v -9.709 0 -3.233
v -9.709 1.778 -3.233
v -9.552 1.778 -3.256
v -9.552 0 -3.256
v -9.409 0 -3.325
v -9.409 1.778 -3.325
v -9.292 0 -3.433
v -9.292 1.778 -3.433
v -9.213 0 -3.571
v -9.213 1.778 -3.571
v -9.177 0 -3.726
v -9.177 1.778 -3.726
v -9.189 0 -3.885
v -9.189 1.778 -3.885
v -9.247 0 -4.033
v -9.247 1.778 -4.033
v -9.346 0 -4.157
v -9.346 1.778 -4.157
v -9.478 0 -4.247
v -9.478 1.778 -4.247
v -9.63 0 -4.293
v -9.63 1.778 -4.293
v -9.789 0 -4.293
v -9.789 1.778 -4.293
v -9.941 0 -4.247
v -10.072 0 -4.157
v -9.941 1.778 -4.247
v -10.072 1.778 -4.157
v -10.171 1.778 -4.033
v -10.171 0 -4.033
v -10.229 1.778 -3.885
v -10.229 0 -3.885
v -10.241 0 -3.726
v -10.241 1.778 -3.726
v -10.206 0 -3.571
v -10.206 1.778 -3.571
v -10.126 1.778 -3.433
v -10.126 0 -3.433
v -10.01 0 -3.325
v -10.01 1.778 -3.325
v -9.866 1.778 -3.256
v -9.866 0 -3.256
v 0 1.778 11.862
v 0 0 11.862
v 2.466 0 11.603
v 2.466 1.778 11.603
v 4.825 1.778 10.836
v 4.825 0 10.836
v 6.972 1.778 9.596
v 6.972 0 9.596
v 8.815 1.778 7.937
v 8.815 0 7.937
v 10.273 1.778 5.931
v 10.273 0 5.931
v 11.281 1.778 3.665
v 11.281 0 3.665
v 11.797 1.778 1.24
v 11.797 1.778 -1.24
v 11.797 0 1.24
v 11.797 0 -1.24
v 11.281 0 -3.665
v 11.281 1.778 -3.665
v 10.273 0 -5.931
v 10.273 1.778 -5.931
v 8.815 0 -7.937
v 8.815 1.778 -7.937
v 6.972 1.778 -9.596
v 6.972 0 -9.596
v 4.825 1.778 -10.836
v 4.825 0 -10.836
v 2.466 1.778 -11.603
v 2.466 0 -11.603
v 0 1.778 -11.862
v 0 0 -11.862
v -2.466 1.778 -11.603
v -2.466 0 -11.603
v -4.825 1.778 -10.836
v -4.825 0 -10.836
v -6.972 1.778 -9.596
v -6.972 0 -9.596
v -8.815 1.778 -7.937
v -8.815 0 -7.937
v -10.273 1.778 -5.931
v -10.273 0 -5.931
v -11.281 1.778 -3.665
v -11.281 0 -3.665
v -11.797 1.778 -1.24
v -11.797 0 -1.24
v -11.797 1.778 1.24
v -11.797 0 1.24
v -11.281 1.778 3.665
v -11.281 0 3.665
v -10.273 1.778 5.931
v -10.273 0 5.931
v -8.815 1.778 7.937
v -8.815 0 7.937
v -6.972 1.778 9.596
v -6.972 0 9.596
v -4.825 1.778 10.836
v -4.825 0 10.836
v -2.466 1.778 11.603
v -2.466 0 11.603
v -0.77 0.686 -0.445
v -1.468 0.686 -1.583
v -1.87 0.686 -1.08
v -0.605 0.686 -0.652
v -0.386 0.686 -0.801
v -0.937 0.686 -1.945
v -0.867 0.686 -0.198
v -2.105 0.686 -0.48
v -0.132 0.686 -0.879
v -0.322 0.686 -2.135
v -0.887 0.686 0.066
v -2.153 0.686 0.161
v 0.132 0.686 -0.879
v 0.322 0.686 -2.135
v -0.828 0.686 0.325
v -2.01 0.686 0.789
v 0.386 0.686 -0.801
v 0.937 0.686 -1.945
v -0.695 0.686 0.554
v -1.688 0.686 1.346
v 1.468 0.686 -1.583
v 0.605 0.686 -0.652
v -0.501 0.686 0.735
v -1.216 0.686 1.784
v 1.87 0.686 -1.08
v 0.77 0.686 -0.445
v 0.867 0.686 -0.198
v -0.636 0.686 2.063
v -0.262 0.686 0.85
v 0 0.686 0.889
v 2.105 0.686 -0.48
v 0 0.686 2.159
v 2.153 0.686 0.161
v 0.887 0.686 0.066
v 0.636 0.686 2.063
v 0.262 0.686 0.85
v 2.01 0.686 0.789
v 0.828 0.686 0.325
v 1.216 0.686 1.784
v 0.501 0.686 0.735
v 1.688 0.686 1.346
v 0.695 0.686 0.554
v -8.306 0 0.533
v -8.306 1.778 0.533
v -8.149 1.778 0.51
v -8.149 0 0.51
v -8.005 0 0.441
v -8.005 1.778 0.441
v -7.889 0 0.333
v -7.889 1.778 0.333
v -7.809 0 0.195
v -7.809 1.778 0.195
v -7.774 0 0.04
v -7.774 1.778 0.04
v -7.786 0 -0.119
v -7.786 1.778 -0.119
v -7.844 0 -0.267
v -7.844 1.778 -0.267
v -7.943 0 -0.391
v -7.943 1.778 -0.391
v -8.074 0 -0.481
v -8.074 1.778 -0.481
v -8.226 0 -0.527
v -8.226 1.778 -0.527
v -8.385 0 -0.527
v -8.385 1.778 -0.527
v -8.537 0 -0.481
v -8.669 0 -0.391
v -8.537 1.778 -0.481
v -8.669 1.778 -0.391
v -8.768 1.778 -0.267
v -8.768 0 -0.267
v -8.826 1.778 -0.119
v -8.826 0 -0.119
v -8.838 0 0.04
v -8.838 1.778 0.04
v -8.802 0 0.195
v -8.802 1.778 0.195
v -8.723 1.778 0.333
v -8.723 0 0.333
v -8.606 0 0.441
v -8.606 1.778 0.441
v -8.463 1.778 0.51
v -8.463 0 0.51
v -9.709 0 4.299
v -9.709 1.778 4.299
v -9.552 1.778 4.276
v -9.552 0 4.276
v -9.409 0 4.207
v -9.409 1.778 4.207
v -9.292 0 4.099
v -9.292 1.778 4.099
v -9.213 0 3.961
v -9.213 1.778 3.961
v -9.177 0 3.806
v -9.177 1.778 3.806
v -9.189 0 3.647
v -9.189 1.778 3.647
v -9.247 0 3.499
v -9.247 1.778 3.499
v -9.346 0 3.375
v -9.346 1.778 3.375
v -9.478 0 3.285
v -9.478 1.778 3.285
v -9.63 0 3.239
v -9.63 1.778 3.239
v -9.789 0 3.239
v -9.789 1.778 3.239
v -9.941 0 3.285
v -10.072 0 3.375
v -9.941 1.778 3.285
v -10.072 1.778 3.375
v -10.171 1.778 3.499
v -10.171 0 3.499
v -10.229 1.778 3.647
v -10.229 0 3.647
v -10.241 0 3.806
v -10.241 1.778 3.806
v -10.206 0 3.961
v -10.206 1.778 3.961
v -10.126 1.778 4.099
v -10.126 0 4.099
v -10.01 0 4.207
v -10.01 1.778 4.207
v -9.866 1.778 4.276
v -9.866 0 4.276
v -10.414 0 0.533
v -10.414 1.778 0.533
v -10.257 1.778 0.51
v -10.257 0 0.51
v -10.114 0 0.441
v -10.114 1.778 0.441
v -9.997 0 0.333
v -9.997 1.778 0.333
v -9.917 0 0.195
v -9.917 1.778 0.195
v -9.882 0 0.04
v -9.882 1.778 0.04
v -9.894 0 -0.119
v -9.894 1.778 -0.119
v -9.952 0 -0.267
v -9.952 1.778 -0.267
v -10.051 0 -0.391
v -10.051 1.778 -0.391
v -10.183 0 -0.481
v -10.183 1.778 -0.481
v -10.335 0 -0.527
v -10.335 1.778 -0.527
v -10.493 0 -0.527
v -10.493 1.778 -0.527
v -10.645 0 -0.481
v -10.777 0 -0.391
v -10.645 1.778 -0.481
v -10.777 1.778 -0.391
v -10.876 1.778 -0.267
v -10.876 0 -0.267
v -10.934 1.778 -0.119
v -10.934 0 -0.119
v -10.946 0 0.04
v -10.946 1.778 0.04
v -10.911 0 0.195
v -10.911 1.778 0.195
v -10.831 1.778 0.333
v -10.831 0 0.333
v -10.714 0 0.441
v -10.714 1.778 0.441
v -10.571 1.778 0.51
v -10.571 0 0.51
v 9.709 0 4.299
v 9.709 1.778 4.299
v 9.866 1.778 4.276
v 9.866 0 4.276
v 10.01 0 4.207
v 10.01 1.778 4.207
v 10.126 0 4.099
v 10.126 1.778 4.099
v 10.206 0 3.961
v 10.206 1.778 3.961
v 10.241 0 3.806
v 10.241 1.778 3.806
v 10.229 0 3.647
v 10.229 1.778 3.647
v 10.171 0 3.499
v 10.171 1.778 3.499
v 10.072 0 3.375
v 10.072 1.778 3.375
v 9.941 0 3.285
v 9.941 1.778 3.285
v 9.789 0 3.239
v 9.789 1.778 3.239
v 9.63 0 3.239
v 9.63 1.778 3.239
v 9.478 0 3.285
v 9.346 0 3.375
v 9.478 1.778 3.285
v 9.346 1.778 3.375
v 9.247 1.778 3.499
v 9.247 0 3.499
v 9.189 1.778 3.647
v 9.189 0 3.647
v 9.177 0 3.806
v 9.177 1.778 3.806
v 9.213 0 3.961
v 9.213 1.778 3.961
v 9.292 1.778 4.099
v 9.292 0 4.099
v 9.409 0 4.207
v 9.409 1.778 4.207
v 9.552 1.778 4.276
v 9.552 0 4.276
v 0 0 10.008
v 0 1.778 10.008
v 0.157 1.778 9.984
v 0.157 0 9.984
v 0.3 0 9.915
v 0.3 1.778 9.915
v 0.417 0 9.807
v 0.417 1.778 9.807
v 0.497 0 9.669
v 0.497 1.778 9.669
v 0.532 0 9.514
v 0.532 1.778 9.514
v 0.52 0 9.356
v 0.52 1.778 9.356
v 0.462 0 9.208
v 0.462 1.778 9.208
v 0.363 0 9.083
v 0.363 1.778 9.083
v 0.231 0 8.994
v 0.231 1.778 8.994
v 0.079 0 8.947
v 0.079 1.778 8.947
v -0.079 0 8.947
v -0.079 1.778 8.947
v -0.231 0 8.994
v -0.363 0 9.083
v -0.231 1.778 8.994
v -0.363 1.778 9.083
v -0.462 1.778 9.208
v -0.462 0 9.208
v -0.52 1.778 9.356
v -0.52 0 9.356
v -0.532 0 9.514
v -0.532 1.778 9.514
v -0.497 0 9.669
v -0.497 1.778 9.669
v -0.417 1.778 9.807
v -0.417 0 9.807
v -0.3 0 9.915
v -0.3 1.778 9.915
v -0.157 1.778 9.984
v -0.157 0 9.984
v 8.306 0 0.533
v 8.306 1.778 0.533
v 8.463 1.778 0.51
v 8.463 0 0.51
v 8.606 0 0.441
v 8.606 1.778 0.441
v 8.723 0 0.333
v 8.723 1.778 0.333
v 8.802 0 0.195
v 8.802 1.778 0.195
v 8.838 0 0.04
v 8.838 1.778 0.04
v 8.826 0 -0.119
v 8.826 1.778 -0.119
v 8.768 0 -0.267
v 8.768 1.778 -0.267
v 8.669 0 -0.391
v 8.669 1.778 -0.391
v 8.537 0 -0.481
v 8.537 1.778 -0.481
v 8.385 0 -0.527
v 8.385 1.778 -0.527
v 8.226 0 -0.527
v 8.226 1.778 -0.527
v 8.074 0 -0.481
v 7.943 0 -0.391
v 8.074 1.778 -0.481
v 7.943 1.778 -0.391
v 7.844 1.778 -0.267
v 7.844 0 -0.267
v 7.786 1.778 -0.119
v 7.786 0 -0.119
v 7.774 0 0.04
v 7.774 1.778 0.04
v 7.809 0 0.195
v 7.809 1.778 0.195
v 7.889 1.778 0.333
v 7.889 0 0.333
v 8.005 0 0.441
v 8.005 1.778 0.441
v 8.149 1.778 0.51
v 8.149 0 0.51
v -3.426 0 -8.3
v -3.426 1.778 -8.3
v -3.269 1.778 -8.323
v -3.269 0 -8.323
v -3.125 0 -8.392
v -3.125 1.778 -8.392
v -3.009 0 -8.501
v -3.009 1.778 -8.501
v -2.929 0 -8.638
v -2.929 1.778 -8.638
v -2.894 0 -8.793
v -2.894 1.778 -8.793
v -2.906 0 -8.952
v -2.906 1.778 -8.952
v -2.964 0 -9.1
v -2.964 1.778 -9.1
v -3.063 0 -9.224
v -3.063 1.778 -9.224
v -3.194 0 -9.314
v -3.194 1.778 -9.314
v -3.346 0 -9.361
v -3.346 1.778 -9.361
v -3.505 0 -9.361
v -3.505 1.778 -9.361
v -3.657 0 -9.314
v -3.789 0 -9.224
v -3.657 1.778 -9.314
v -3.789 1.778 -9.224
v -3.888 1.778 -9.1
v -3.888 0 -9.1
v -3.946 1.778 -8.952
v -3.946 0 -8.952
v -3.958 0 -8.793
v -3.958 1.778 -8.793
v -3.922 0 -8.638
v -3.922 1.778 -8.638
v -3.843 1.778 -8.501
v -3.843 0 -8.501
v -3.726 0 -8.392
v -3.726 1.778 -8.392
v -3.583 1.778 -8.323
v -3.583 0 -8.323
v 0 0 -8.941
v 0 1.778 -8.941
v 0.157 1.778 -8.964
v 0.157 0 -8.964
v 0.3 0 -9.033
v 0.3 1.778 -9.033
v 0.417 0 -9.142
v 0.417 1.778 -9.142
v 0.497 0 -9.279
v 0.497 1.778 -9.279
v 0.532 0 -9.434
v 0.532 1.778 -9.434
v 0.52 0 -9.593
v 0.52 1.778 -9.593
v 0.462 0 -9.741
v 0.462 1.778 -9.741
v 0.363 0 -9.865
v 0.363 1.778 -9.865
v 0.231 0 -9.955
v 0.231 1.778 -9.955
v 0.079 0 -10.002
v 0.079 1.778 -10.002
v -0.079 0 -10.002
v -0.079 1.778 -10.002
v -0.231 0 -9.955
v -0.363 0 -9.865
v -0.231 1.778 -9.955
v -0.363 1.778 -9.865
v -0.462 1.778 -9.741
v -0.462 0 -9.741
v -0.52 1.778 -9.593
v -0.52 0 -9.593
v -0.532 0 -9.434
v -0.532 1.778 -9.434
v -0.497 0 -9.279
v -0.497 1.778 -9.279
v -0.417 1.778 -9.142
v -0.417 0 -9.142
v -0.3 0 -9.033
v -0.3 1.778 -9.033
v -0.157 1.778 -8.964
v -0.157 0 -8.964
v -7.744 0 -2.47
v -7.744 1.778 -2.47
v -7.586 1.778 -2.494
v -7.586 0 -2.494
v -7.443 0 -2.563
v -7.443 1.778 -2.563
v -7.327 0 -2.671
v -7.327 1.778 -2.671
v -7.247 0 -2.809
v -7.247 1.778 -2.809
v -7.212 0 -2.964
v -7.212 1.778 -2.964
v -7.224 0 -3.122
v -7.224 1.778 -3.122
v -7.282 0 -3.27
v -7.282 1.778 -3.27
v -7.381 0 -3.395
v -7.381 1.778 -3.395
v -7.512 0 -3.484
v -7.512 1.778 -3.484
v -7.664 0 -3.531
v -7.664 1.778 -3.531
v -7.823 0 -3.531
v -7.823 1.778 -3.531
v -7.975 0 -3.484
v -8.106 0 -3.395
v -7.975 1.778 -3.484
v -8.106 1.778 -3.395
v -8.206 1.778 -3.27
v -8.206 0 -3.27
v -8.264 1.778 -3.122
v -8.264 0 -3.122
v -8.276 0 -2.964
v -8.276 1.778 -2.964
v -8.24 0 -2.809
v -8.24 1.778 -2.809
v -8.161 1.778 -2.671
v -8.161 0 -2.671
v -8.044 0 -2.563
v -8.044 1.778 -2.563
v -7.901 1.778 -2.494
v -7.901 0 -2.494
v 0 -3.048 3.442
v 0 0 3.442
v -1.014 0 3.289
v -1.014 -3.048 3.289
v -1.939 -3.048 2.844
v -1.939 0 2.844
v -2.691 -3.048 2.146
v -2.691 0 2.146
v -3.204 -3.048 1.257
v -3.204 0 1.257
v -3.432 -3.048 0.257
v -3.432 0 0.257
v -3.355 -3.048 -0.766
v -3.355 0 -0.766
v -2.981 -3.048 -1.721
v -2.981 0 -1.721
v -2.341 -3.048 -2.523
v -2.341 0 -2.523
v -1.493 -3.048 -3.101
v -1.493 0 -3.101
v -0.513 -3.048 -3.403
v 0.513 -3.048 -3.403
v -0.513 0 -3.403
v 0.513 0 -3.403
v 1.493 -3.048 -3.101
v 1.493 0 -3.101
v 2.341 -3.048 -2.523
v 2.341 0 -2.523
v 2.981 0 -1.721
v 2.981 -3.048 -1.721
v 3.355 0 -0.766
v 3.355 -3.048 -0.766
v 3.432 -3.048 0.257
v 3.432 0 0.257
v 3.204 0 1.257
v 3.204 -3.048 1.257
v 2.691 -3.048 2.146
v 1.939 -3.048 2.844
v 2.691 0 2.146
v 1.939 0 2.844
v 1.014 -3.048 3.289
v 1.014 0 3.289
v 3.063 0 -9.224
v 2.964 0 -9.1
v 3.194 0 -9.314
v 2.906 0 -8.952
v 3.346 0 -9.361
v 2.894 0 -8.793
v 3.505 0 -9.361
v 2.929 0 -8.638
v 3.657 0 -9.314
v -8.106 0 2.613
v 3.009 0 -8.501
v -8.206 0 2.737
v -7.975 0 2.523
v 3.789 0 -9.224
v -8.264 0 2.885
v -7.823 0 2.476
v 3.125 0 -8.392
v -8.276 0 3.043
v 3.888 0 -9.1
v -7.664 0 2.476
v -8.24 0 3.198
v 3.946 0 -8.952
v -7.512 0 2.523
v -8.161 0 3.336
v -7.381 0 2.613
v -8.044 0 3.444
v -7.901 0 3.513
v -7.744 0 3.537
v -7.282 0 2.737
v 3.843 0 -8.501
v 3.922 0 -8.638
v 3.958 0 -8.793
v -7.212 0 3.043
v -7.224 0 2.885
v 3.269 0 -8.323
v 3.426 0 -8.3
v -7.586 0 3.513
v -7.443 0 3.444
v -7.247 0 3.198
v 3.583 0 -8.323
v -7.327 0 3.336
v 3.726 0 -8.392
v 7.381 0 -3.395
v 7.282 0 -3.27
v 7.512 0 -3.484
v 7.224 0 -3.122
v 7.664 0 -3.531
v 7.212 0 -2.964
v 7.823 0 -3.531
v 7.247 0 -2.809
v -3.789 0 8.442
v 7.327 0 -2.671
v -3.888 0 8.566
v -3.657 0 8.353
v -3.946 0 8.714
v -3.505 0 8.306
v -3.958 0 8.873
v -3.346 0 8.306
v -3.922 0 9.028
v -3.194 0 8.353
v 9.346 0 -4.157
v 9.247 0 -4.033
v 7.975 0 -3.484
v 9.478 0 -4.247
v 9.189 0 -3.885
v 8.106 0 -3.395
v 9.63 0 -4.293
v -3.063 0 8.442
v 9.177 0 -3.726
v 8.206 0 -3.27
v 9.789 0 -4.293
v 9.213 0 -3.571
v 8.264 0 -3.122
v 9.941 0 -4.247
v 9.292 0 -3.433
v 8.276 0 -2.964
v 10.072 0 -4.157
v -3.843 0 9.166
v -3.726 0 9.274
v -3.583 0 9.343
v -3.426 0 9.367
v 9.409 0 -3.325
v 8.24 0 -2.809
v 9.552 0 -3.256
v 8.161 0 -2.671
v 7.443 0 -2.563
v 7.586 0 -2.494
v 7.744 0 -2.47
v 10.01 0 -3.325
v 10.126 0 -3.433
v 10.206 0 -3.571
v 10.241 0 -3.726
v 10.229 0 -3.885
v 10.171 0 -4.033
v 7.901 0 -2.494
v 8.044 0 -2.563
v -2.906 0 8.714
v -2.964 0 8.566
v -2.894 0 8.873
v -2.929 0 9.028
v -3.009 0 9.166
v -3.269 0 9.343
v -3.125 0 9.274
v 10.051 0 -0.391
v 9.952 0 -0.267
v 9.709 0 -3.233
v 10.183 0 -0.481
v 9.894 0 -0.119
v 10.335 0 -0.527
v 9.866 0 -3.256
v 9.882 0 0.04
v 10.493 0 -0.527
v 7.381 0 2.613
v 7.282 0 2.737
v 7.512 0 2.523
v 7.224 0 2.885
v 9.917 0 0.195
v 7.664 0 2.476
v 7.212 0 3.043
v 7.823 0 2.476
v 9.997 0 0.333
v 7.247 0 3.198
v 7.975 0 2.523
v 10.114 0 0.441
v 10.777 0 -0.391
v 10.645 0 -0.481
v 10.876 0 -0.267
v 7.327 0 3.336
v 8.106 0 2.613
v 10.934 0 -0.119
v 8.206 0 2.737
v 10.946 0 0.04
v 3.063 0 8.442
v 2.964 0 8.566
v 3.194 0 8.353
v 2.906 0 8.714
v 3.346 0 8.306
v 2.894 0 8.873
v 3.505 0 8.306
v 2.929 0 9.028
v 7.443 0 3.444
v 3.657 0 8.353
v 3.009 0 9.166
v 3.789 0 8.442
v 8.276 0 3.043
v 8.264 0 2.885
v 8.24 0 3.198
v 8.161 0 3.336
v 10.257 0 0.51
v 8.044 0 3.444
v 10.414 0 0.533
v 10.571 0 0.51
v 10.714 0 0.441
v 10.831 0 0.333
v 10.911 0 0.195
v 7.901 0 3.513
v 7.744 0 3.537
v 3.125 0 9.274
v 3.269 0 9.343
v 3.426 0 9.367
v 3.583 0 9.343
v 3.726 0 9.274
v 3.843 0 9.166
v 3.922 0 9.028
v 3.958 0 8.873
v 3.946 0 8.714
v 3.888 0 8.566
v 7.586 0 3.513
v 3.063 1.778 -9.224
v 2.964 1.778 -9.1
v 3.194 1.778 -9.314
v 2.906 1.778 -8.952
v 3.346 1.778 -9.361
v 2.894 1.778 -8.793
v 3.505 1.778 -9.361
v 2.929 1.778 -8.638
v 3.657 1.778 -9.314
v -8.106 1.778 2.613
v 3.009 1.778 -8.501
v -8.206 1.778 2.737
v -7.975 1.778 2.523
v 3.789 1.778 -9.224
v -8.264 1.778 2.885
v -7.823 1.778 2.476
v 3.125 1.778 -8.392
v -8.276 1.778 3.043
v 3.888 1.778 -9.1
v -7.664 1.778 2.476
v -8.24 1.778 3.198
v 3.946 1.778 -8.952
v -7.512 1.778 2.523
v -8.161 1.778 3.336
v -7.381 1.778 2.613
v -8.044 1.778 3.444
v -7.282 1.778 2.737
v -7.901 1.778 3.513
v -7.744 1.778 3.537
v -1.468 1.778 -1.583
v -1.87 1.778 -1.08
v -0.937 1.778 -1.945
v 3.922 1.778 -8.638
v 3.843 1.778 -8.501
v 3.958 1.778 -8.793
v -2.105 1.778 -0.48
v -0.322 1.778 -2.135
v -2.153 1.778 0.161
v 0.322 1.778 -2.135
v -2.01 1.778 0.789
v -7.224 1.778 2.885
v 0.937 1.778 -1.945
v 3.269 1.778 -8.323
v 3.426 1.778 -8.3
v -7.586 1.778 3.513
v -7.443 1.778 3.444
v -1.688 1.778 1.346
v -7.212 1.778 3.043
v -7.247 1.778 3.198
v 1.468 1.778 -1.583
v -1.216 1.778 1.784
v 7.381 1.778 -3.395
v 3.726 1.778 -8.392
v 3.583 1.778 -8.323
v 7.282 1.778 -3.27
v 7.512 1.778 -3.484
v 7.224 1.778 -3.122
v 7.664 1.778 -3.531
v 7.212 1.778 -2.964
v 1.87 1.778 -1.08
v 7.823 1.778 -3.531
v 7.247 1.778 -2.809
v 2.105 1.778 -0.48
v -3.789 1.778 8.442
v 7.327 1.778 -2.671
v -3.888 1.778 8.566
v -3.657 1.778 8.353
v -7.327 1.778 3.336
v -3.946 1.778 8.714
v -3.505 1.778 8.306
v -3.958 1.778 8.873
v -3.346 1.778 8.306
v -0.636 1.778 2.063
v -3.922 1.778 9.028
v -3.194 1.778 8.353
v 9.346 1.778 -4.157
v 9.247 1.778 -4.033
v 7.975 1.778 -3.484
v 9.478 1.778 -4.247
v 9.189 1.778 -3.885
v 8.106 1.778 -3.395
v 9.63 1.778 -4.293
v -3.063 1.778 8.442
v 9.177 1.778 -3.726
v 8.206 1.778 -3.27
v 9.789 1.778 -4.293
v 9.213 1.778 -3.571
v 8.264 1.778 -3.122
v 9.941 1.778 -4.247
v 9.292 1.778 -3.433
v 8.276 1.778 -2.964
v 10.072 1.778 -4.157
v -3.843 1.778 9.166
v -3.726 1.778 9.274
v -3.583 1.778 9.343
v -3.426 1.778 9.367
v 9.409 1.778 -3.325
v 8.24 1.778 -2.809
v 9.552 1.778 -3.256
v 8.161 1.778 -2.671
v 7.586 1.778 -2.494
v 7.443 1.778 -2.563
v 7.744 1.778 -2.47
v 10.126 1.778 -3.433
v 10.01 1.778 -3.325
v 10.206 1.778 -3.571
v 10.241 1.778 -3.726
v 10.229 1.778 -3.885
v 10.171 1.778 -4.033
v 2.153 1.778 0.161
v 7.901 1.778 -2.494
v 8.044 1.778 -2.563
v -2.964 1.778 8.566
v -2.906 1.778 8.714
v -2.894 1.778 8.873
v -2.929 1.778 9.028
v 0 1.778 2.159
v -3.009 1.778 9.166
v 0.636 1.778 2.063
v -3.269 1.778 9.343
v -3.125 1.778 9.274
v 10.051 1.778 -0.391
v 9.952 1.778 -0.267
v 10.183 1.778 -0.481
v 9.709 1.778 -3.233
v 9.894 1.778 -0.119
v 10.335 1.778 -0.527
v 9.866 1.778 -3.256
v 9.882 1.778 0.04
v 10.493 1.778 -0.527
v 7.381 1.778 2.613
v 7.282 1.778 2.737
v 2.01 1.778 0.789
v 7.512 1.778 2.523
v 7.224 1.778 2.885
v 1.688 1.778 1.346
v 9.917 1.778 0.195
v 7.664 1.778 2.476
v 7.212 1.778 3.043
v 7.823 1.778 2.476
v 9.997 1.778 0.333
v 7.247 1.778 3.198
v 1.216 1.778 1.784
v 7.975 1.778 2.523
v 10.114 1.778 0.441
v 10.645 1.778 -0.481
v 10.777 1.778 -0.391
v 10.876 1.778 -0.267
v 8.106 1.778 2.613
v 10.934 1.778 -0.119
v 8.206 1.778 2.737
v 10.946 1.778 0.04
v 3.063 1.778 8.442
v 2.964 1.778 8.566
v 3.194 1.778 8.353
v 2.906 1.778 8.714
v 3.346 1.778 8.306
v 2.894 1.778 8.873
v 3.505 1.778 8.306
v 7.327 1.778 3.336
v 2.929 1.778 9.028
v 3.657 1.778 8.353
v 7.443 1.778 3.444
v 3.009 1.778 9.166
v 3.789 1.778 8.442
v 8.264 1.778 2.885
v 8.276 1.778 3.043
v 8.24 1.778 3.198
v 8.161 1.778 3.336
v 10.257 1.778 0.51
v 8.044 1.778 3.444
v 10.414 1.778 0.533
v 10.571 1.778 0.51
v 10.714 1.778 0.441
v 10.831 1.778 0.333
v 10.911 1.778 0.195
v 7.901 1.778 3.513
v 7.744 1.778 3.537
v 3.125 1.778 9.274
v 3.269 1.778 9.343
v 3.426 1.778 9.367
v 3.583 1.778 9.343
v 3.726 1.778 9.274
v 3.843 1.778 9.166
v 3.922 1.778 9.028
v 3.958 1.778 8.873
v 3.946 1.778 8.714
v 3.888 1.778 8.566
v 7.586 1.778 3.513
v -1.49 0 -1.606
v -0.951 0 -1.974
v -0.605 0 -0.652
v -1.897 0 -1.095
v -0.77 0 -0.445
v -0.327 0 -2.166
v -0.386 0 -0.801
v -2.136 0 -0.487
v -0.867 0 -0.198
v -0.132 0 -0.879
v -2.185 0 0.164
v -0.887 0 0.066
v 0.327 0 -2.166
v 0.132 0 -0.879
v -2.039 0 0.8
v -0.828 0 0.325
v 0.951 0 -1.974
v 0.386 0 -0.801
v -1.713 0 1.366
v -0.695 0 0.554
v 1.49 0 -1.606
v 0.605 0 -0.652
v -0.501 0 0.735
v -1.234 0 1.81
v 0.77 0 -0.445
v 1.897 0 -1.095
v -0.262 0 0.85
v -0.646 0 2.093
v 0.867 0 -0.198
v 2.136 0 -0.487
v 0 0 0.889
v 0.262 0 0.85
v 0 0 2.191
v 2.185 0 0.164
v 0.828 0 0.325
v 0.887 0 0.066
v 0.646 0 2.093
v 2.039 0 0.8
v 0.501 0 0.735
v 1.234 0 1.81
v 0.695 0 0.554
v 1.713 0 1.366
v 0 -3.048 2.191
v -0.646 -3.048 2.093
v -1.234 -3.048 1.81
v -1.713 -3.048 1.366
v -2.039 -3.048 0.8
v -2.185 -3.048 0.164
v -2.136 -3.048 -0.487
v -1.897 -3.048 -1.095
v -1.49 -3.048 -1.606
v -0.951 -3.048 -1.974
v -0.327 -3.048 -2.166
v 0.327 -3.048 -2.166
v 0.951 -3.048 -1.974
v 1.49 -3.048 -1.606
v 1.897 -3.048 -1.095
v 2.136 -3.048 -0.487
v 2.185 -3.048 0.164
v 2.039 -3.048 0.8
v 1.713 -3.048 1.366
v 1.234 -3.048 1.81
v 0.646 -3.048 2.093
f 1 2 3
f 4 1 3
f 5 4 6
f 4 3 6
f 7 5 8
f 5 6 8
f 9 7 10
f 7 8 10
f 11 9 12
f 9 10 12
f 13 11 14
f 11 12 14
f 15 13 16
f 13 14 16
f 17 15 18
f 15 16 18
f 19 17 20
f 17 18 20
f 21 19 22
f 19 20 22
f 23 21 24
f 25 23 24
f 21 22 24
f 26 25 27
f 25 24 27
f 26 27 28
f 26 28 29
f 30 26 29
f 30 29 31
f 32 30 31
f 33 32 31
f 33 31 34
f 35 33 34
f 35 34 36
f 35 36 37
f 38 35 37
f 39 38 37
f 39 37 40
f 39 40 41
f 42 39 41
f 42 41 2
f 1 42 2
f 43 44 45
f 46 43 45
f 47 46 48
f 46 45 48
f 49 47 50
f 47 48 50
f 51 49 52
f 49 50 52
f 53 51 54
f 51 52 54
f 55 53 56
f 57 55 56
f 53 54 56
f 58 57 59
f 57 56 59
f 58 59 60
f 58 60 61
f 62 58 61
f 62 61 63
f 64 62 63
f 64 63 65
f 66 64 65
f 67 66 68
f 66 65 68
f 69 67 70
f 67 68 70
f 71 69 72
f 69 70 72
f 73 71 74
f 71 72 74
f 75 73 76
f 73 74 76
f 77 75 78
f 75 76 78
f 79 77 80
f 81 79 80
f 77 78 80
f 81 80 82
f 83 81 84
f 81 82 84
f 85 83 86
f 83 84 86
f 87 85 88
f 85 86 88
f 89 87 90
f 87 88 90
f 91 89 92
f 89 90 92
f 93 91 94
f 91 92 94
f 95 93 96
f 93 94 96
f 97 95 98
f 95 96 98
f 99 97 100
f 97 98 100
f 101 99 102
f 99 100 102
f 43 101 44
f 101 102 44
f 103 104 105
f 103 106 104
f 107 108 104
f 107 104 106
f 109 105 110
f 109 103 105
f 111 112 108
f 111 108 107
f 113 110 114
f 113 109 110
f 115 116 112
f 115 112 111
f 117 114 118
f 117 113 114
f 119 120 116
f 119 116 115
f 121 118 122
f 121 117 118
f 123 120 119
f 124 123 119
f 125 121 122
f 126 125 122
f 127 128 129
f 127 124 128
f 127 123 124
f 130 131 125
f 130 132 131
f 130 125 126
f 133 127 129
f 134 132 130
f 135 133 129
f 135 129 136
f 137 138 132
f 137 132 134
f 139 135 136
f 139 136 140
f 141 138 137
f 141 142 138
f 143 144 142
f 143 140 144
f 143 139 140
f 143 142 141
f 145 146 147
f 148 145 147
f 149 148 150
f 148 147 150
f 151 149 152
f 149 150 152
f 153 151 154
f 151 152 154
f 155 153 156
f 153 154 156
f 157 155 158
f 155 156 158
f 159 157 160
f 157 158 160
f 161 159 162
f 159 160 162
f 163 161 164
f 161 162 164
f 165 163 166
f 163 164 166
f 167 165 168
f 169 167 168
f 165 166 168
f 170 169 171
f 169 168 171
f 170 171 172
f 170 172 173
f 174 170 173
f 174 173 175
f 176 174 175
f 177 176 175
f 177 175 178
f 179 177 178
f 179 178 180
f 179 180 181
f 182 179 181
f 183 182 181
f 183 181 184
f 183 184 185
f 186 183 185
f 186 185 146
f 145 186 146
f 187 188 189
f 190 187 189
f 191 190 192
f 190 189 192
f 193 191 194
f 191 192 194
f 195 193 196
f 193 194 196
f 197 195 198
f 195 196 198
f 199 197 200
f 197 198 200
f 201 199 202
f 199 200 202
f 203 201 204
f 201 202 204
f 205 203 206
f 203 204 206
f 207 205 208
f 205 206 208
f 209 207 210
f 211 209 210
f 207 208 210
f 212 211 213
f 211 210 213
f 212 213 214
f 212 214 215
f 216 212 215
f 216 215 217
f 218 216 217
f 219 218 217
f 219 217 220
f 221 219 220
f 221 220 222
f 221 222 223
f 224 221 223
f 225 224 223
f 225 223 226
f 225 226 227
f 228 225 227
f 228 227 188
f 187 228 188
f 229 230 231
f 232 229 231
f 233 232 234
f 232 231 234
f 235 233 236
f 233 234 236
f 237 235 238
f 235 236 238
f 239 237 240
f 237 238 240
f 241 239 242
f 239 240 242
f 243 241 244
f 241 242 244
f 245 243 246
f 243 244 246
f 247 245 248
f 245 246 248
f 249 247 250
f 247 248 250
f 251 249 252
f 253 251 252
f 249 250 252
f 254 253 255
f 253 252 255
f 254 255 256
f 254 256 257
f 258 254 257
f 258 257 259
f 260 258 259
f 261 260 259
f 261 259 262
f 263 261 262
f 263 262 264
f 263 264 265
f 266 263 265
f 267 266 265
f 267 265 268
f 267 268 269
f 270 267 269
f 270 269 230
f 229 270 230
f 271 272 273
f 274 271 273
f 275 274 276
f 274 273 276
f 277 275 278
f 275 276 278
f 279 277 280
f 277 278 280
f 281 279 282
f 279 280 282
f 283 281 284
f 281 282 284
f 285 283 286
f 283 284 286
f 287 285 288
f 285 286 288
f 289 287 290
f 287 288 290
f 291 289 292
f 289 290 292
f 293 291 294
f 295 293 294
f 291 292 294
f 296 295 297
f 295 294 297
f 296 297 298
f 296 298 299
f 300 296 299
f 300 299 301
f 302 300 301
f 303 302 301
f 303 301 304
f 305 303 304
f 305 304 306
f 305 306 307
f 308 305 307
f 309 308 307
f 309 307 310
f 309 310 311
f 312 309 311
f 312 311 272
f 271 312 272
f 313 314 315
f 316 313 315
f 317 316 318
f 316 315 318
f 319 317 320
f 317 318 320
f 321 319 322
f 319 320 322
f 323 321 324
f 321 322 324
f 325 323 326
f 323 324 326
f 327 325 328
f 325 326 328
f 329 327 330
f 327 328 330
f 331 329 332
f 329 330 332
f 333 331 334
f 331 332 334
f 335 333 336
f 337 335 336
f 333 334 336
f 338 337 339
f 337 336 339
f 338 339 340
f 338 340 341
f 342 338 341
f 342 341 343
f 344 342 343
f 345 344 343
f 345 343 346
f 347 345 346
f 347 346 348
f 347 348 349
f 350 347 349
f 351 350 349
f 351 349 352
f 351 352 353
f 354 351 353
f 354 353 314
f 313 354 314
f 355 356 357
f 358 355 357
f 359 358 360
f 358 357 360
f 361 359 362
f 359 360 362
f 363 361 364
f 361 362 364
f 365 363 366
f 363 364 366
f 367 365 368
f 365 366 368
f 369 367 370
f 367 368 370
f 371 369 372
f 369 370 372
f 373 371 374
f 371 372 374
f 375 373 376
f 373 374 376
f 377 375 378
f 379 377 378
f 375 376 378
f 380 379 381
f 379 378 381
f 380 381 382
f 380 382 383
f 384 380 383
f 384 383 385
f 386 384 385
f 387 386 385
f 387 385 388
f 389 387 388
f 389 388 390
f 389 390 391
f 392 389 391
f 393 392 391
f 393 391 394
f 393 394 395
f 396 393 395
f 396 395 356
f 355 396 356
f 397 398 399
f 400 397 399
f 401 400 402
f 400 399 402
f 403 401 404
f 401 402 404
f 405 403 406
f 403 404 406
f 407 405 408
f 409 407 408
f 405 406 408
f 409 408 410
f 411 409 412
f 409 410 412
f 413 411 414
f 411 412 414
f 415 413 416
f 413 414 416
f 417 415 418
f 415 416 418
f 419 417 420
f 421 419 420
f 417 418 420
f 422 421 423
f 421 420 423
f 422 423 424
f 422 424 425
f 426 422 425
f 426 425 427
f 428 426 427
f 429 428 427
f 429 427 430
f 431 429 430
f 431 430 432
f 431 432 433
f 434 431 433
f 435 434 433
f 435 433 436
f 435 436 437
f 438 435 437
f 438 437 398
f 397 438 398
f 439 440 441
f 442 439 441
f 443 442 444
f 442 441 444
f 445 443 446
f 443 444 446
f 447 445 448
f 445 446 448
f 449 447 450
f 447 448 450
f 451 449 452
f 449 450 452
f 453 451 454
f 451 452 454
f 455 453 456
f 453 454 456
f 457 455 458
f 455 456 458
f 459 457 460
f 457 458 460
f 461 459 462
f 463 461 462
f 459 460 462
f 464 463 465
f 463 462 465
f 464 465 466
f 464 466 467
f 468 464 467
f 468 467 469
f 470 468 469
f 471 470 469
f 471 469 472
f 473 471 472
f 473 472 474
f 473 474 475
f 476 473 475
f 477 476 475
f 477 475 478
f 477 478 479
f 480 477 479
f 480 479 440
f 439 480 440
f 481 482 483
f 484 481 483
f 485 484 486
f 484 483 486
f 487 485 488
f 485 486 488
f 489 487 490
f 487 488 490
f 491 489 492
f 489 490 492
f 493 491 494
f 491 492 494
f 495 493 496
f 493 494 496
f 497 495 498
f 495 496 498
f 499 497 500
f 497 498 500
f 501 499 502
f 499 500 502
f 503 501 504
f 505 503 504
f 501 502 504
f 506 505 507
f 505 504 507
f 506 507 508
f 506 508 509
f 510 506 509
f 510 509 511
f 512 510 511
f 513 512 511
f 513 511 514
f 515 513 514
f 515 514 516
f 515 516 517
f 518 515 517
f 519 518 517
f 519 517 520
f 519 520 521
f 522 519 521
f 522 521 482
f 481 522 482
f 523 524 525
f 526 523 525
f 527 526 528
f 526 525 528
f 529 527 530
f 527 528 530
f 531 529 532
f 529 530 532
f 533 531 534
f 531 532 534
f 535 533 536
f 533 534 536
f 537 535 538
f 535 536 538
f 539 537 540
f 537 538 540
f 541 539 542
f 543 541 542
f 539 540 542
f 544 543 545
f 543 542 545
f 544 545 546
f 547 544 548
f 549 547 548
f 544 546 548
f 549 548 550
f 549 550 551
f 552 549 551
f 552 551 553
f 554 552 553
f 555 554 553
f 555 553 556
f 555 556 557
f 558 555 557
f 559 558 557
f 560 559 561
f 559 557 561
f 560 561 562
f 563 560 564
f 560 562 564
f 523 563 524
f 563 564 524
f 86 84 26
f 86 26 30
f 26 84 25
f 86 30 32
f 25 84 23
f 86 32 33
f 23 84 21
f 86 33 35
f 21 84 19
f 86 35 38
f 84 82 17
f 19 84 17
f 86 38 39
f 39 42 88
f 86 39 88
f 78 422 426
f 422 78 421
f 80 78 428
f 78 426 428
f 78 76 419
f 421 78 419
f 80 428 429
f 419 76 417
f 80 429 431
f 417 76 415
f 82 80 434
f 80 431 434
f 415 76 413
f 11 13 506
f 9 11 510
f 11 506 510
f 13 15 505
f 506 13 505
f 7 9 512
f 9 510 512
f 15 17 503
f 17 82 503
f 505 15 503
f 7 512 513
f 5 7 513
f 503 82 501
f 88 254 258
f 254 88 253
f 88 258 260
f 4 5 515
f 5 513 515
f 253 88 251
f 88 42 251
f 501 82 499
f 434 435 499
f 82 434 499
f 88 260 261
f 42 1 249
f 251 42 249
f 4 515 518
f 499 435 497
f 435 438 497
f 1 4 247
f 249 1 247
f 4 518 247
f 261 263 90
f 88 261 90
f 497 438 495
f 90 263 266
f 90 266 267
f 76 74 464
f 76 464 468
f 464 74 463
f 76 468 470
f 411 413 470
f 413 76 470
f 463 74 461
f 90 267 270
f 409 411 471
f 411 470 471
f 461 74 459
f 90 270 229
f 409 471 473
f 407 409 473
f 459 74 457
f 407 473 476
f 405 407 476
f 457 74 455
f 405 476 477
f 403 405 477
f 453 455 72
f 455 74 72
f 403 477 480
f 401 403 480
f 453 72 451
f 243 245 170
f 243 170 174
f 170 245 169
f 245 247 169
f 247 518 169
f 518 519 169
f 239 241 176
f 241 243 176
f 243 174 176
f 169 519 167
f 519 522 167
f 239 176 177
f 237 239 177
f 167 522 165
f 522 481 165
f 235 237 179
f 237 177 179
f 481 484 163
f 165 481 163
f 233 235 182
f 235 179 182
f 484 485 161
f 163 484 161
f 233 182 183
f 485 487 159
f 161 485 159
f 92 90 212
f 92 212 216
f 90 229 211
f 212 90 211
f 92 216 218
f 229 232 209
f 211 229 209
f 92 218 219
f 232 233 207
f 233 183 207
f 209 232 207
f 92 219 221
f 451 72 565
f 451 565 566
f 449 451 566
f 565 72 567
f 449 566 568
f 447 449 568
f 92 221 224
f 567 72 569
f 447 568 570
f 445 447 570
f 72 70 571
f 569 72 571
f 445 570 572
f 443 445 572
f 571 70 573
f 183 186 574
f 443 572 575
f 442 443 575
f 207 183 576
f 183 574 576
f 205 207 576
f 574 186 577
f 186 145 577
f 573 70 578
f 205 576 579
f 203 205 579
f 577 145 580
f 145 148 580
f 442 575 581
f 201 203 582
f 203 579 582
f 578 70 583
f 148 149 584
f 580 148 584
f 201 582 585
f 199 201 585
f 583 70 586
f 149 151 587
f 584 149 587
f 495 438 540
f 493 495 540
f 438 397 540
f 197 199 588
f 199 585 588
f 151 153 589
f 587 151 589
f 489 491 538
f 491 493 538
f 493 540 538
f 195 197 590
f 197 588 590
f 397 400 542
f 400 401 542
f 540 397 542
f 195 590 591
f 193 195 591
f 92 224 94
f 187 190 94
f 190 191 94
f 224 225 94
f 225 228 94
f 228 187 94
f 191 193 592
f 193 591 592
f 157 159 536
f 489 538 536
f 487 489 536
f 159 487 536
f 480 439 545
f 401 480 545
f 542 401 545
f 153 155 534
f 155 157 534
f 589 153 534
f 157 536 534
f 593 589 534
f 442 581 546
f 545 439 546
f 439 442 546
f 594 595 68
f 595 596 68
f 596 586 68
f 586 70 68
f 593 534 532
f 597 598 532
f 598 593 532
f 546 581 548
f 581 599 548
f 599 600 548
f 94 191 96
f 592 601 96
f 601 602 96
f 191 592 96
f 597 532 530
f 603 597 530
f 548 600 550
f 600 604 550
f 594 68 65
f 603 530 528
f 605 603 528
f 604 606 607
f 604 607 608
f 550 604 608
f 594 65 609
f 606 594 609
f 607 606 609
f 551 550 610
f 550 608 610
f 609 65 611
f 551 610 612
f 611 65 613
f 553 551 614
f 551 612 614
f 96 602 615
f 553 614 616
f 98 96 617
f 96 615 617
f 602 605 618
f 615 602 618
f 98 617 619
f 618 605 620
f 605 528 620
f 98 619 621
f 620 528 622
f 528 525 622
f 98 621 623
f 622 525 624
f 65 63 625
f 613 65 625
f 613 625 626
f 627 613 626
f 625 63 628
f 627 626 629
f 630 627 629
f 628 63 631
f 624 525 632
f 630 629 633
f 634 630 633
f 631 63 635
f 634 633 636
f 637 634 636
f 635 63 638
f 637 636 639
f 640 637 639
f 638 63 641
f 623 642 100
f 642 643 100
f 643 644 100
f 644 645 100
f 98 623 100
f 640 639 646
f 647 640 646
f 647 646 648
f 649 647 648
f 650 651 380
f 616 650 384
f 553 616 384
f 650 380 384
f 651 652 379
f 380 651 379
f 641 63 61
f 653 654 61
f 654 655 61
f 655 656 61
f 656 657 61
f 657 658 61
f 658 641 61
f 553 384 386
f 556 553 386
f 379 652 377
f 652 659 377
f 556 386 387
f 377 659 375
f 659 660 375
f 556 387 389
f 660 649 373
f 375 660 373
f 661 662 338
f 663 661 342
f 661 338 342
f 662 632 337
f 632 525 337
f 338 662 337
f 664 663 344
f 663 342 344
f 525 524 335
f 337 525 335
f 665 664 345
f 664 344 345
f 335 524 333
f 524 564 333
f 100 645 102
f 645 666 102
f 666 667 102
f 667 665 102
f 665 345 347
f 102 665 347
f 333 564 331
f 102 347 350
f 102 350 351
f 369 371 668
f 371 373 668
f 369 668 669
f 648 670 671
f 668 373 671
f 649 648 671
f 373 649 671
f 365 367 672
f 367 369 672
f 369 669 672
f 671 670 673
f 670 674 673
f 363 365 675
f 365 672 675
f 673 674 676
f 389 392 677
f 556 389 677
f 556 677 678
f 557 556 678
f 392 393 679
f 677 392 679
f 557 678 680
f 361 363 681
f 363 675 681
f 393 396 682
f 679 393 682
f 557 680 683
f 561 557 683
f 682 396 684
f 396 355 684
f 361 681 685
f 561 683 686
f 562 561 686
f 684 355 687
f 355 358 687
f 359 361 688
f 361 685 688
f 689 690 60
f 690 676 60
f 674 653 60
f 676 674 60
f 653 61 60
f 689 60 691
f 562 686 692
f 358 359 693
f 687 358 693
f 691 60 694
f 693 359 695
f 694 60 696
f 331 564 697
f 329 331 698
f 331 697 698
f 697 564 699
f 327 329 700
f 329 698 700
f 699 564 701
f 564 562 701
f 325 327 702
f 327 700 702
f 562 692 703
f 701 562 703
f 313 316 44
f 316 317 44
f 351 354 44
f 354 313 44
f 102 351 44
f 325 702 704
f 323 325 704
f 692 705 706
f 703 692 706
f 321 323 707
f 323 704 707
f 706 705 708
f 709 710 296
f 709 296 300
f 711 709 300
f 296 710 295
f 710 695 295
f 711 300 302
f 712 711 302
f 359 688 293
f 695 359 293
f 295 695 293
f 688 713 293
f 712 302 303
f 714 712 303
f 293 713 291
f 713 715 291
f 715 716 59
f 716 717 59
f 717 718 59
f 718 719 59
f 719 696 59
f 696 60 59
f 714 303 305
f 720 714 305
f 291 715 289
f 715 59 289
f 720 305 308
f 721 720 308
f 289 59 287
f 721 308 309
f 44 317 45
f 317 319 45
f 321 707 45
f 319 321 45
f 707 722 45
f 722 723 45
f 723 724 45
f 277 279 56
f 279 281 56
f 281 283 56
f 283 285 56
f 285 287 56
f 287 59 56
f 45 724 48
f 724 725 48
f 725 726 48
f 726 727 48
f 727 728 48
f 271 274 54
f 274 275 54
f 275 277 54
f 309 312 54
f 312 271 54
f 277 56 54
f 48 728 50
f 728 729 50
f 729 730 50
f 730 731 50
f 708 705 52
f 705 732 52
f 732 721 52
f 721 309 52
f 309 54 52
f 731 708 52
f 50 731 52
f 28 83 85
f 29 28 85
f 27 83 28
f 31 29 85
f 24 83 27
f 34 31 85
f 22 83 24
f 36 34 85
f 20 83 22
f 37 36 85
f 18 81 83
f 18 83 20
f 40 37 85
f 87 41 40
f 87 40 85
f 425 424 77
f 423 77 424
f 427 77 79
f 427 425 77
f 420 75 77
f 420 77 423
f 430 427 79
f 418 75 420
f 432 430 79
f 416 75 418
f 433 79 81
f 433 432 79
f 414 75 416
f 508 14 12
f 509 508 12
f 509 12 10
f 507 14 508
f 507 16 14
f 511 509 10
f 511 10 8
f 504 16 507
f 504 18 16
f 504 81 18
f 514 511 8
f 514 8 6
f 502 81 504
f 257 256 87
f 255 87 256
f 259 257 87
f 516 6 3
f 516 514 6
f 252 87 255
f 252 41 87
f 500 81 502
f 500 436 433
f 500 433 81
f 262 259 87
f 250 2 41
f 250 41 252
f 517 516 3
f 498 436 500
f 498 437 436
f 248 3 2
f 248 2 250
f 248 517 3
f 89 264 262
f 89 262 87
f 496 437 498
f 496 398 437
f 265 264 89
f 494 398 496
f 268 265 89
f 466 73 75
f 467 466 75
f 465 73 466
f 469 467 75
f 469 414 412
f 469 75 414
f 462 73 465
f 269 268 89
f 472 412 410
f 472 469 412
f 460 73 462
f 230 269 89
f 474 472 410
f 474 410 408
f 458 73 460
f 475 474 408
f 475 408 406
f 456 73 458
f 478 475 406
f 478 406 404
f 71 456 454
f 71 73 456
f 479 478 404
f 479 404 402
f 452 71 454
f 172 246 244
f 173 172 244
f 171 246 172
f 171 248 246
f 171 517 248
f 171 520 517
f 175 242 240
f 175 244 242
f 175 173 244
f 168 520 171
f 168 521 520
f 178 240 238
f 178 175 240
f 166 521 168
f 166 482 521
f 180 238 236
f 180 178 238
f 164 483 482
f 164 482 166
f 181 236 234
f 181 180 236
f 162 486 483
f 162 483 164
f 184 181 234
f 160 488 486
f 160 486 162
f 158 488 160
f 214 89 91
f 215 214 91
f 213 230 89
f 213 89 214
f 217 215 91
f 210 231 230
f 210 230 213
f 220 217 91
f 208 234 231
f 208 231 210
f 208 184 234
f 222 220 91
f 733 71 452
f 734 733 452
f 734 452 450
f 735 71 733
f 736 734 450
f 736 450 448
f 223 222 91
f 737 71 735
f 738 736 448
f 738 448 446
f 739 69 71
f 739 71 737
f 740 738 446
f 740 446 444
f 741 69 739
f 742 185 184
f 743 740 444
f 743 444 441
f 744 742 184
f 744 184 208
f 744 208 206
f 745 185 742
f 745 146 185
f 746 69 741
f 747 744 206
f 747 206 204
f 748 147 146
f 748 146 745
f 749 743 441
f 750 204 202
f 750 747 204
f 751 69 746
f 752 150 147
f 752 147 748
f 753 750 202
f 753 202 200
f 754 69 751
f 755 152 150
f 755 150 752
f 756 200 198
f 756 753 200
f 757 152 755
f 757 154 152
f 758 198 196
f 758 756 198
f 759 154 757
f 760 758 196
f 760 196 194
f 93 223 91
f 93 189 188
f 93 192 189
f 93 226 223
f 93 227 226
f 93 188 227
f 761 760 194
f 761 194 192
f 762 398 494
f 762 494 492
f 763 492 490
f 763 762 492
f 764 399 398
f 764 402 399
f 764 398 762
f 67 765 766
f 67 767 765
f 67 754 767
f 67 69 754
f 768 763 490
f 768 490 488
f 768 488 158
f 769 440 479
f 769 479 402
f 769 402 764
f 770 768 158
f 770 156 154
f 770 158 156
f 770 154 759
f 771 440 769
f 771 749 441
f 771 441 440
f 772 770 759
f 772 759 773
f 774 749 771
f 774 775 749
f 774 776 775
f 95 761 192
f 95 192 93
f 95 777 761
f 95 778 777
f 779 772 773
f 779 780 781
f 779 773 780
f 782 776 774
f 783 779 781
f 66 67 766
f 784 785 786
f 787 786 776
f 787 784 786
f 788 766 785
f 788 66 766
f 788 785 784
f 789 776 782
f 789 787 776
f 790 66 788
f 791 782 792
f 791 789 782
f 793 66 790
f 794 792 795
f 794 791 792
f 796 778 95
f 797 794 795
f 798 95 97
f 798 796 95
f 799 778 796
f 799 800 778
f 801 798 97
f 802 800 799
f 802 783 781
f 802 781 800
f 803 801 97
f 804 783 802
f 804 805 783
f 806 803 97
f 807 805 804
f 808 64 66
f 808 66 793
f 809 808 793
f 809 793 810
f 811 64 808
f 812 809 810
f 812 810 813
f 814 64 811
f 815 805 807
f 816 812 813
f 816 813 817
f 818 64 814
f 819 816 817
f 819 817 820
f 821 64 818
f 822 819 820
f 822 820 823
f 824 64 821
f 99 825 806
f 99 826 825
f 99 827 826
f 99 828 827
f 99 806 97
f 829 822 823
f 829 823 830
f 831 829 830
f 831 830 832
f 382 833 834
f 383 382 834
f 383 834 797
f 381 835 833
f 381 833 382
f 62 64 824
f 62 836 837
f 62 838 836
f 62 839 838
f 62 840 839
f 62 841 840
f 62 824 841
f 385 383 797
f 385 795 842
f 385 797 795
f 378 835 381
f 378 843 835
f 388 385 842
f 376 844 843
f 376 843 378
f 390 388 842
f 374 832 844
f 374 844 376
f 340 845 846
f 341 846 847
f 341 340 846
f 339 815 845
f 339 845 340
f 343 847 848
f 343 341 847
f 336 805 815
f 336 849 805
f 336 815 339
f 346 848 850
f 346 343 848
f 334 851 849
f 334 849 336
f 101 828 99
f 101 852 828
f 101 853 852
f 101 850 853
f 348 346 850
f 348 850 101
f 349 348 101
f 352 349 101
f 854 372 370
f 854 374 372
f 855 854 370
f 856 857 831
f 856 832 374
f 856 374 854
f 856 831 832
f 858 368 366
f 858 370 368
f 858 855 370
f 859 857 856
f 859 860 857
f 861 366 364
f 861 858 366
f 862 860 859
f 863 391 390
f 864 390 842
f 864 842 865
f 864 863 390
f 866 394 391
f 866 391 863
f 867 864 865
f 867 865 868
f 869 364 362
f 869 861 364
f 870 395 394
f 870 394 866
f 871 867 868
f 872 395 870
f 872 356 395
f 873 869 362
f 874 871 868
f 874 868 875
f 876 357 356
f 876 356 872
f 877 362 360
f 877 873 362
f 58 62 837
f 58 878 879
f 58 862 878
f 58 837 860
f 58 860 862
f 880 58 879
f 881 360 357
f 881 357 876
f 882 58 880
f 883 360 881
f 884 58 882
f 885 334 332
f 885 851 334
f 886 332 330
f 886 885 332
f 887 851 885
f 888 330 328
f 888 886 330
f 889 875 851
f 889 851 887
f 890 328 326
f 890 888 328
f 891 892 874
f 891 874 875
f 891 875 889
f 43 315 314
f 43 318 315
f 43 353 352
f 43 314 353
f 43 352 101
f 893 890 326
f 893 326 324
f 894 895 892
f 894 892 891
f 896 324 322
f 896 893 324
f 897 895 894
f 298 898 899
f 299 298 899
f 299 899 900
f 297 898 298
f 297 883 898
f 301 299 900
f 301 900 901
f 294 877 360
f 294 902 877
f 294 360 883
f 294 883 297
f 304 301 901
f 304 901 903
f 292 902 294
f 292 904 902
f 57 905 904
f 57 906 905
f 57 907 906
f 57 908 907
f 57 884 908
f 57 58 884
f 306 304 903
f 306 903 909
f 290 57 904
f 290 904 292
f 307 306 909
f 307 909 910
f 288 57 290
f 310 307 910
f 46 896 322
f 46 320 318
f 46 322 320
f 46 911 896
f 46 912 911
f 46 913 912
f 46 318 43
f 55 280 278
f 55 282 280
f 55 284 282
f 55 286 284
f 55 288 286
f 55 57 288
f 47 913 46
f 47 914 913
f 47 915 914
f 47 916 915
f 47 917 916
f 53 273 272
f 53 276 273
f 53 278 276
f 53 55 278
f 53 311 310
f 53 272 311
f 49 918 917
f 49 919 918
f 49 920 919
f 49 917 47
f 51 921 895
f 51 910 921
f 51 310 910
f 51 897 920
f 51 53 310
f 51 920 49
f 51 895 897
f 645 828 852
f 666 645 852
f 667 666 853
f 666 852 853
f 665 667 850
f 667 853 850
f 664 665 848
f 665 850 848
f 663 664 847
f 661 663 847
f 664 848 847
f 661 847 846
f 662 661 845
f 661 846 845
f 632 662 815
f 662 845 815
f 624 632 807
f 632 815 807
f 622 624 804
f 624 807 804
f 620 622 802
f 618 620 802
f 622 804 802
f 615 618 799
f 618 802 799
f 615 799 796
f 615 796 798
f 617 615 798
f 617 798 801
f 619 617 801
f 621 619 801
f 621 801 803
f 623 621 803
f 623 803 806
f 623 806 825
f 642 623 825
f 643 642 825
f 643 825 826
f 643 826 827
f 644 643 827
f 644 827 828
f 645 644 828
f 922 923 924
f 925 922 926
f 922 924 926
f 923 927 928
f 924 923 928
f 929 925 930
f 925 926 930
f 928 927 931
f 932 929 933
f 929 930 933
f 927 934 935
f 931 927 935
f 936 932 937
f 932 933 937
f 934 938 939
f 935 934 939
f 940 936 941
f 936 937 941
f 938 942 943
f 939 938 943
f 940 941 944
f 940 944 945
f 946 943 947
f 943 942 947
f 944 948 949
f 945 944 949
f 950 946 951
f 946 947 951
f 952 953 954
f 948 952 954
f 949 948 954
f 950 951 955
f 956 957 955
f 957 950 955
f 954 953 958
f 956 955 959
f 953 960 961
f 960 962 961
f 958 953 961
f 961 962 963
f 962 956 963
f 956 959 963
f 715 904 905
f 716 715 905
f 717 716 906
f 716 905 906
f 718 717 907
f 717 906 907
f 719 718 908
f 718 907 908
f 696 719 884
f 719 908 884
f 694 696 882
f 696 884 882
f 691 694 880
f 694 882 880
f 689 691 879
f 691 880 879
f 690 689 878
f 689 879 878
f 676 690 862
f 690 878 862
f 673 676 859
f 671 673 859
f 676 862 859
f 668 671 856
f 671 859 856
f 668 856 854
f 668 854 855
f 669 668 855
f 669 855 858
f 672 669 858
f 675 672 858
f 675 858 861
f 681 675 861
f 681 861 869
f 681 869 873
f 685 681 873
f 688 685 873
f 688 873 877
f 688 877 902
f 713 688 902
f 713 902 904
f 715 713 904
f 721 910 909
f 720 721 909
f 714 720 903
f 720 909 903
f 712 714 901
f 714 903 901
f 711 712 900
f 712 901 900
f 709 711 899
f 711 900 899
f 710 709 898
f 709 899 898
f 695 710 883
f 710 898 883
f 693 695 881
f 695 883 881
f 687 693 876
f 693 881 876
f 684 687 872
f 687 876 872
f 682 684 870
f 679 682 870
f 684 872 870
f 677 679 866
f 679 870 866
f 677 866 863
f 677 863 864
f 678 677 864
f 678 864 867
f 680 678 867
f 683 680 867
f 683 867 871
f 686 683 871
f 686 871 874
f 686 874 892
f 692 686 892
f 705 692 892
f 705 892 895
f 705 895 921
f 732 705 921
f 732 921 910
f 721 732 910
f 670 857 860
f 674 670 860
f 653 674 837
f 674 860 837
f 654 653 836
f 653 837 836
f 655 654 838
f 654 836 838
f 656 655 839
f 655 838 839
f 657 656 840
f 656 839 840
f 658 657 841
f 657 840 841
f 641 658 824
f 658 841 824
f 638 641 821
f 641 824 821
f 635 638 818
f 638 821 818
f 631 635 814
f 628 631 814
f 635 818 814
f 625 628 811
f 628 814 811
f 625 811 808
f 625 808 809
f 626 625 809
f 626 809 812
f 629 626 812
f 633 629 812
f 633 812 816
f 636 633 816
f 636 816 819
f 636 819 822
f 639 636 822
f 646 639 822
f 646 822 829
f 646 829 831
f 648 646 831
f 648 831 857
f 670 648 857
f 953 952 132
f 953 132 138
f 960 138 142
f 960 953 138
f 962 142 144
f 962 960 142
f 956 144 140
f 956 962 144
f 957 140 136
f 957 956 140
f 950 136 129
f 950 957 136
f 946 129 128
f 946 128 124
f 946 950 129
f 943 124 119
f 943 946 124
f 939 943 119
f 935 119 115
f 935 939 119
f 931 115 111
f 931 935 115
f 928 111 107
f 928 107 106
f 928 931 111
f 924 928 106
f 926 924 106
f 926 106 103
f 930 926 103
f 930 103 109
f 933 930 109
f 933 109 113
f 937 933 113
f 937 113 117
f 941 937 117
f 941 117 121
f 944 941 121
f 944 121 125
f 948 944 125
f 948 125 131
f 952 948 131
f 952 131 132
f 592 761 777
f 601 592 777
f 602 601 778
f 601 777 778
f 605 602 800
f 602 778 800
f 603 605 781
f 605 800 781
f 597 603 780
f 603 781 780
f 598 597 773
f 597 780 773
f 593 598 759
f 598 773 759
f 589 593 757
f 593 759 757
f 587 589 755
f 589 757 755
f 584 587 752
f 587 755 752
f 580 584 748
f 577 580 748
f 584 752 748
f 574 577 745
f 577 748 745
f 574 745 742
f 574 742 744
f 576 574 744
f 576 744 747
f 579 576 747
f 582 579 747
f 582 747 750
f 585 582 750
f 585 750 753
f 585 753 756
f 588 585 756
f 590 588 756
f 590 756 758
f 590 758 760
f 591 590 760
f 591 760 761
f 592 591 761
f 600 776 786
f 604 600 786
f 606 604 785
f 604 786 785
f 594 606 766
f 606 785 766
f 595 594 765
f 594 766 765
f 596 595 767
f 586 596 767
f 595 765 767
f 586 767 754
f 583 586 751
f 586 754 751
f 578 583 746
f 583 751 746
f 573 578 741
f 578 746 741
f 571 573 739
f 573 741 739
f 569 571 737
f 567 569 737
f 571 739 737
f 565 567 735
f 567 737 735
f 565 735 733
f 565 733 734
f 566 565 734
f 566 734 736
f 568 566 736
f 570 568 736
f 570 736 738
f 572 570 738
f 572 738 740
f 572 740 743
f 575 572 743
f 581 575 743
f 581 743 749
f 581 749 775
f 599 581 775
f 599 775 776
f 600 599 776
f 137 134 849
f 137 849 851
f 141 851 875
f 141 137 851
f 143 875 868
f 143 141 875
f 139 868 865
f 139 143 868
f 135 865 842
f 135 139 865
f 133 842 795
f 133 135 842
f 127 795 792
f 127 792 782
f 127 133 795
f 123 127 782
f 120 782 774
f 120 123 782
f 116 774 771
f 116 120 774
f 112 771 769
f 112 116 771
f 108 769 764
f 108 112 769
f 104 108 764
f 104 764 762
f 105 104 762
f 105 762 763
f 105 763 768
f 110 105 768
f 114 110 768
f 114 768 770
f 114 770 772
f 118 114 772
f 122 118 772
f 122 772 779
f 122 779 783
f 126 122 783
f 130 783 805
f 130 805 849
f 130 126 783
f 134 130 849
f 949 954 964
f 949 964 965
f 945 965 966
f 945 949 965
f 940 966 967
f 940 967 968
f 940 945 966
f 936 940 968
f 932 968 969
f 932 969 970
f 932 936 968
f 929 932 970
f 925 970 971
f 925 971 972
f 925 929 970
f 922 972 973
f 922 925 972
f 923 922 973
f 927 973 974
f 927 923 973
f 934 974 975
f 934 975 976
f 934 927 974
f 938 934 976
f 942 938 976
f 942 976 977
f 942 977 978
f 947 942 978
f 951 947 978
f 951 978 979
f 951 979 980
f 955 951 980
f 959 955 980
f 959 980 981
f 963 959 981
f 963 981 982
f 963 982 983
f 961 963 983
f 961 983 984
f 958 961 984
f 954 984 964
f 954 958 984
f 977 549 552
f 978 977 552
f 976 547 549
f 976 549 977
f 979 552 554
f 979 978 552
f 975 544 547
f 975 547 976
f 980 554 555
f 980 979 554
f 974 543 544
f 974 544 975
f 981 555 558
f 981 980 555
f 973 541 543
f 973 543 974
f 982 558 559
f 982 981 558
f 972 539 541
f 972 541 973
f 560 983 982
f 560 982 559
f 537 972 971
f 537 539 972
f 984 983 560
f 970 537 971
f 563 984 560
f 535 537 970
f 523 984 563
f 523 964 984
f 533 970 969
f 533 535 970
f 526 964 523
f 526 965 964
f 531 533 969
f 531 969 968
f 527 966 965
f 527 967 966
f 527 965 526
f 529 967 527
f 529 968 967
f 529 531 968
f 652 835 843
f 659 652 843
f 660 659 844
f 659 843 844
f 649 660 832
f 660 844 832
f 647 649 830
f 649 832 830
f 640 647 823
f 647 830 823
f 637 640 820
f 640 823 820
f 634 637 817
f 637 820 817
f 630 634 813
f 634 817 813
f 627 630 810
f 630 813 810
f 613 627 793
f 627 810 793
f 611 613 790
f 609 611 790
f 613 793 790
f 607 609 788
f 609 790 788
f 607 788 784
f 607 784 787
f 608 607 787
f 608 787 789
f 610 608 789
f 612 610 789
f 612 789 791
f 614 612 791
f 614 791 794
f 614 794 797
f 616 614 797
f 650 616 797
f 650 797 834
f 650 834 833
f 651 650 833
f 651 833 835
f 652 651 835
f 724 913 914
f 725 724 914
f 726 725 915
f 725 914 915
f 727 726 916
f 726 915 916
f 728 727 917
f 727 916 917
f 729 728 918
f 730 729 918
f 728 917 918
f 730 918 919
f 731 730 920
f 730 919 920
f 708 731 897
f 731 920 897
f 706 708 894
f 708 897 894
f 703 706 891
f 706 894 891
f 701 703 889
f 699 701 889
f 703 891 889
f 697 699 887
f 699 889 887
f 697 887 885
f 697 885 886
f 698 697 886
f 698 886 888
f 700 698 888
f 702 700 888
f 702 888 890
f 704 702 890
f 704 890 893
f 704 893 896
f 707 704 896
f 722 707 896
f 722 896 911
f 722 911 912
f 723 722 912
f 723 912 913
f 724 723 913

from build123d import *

# Parameters (mm, degrees)
SKETCH1_R           = 11.8618
SKETCH1_R_2         = 0.889
BOSS_EXTRUDE1_DEPTH = 1.778
SKETCH2_R           = 3.4417
SKETCH2_R_2         = 2.19075
BOSS_EXTRUDE2_DEPTH = 3.048
CUT_EXTRUDE1_START  = -1.0922
SKETCH3_R           = 2.159
SKETCH3_R_2         = 0.889
CUT_EXTRUDE1_DEPTH  = 1.0922
SKETCH4_R           = 0.5334
CUT_EXTRUDE2_DEPTH  = 18.455511292


with BuildPart() as part:
    # Sketch1 → Boss-Extrude1 (new body)
    with BuildSketch(Plane(origin=(0, 0, 0), x_dir=(1, 0, 0), z_dir=(0, 1, 0))):
        with Locations(Location((0, 0, 0), (0, 0, 270))):
            Circle(SKETCH1_R)
        with Locations(Location((0, 0, 0), (0, 0, 270))):
            Circle(SKETCH1_R_2, mode=Mode.SUBTRACT)
    extrude(amount=BOSS_EXTRUDE1_DEPTH)

    # Sketch2 → Boss-Extrude2 (add)
    with BuildSketch(Plane.XZ):
        with Locations(Location((0, 0, 0), (0, 0, 90))):
            Circle(SKETCH2_R)
        with Locations(Location((0, 0, 0), (0, 0, 90))):
            Circle(SKETCH2_R_2, mode=Mode.SUBTRACT)
    extrude(amount=BOSS_EXTRUDE2_DEPTH)

    # Sketch3 → Cut-Extrude1 (cut)
    with BuildSketch(Plane(origin=(0, 1.778, 0), x_dir=(1, 0, 0), z_dir=(0, 1, 0)).offset(CUT_EXTRUDE1_START)):
        with Locations(Location((0, 0, 0), (0, 0, 270))):
            Circle(SKETCH3_R)
        with Locations(Location((0, 0, 0), (0, 0, 270))):
            Circle(SKETCH3_R_2, mode=Mode.SUBTRACT)
    extrude(amount=CUT_EXTRUDE1_DEPTH, mode=Mode.SUBTRACT)

    # Sketch4 → Cut-Extrude2 (cut, through all)
    with BuildSketch(Plane(origin=(0, 1.778, 0), x_dir=(1, 0, 0), z_dir=(0, 1, 0))):
        with Locations(Location((0, 9.4742, 0), (0, 0, 270))):
            Circle(SKETCH4_R)
        with Locations(Location((10.414, 0, 0), (0, 0, 270))):
            Circle(SKETCH4_R)
        with Locations(Location((8.3058, 0, 0), (0, 0, 270))):
            Circle(SKETCH4_R)
        with Locations(Location((3.425780113, 8.833147585, 0), (0, 0, 270))):
            Circle(SKETCH4_R)
        with Locations(Location((-3.425780113, 8.833147585, 0), (0, 0, 270))):
            Circle(SKETCH4_R)
        with Locations(Location((7.743695028, 3.003581354, 0), (0, 0, 270))):
            Circle(SKETCH4_R)
        with Locations(Location((9.709220066, 3.765958273, 0), (0, 0, 270))):
            Circle(SKETCH4_R)
        with Locations(Location((7.743695028, -3.003581354, 0), (0, 0, 270))):
            Circle(SKETCH4_R)
        with Locations(Location((9.709220066, -3.765958273, 0), (0, 0, 270))):
            Circle(SKETCH4_R)
        with Locations(Location((3.425780113, -8.833147585, 0), (0, 0, 270))):
            Circle(SKETCH4_R)
        with Locations(Location((0, -9.4742, 0), (0, 0, 270))):
            Circle(SKETCH4_R)
        with Locations(Location((-3.425780113, -8.833147585, 0), (0, 0, 270))):
            Circle(SKETCH4_R)
        with Locations(Location((-9.709220066, -3.765958273, 0), (0, 0, 270))):
            Circle(SKETCH4_R)
        with Locations(Location((-7.743695028, -3.003581354, 0), (0, 0, 270))):
            Circle(SKETCH4_R)
        with Locations(Location((-9.709220066, 3.765958273, 0), (0, 0, 270))):
            Circle(SKETCH4_R)
        with Locations(Location((-7.743695028, 3.003581354, 0), (0, 0, 270))):
            Circle(SKETCH4_R)
        with Locations(Location((-8.3058, 0, 0), (0, 0, 270))):
            Circle(SKETCH4_R)
        with Locations(Location((-10.414, 0, 0), (0, 0, 270))):
            Circle(SKETCH4_R)
    extrude(amount=-CUT_EXTRUDE2_DEPTH, mode=Mode.SUBTRACT)


solid = part.part
